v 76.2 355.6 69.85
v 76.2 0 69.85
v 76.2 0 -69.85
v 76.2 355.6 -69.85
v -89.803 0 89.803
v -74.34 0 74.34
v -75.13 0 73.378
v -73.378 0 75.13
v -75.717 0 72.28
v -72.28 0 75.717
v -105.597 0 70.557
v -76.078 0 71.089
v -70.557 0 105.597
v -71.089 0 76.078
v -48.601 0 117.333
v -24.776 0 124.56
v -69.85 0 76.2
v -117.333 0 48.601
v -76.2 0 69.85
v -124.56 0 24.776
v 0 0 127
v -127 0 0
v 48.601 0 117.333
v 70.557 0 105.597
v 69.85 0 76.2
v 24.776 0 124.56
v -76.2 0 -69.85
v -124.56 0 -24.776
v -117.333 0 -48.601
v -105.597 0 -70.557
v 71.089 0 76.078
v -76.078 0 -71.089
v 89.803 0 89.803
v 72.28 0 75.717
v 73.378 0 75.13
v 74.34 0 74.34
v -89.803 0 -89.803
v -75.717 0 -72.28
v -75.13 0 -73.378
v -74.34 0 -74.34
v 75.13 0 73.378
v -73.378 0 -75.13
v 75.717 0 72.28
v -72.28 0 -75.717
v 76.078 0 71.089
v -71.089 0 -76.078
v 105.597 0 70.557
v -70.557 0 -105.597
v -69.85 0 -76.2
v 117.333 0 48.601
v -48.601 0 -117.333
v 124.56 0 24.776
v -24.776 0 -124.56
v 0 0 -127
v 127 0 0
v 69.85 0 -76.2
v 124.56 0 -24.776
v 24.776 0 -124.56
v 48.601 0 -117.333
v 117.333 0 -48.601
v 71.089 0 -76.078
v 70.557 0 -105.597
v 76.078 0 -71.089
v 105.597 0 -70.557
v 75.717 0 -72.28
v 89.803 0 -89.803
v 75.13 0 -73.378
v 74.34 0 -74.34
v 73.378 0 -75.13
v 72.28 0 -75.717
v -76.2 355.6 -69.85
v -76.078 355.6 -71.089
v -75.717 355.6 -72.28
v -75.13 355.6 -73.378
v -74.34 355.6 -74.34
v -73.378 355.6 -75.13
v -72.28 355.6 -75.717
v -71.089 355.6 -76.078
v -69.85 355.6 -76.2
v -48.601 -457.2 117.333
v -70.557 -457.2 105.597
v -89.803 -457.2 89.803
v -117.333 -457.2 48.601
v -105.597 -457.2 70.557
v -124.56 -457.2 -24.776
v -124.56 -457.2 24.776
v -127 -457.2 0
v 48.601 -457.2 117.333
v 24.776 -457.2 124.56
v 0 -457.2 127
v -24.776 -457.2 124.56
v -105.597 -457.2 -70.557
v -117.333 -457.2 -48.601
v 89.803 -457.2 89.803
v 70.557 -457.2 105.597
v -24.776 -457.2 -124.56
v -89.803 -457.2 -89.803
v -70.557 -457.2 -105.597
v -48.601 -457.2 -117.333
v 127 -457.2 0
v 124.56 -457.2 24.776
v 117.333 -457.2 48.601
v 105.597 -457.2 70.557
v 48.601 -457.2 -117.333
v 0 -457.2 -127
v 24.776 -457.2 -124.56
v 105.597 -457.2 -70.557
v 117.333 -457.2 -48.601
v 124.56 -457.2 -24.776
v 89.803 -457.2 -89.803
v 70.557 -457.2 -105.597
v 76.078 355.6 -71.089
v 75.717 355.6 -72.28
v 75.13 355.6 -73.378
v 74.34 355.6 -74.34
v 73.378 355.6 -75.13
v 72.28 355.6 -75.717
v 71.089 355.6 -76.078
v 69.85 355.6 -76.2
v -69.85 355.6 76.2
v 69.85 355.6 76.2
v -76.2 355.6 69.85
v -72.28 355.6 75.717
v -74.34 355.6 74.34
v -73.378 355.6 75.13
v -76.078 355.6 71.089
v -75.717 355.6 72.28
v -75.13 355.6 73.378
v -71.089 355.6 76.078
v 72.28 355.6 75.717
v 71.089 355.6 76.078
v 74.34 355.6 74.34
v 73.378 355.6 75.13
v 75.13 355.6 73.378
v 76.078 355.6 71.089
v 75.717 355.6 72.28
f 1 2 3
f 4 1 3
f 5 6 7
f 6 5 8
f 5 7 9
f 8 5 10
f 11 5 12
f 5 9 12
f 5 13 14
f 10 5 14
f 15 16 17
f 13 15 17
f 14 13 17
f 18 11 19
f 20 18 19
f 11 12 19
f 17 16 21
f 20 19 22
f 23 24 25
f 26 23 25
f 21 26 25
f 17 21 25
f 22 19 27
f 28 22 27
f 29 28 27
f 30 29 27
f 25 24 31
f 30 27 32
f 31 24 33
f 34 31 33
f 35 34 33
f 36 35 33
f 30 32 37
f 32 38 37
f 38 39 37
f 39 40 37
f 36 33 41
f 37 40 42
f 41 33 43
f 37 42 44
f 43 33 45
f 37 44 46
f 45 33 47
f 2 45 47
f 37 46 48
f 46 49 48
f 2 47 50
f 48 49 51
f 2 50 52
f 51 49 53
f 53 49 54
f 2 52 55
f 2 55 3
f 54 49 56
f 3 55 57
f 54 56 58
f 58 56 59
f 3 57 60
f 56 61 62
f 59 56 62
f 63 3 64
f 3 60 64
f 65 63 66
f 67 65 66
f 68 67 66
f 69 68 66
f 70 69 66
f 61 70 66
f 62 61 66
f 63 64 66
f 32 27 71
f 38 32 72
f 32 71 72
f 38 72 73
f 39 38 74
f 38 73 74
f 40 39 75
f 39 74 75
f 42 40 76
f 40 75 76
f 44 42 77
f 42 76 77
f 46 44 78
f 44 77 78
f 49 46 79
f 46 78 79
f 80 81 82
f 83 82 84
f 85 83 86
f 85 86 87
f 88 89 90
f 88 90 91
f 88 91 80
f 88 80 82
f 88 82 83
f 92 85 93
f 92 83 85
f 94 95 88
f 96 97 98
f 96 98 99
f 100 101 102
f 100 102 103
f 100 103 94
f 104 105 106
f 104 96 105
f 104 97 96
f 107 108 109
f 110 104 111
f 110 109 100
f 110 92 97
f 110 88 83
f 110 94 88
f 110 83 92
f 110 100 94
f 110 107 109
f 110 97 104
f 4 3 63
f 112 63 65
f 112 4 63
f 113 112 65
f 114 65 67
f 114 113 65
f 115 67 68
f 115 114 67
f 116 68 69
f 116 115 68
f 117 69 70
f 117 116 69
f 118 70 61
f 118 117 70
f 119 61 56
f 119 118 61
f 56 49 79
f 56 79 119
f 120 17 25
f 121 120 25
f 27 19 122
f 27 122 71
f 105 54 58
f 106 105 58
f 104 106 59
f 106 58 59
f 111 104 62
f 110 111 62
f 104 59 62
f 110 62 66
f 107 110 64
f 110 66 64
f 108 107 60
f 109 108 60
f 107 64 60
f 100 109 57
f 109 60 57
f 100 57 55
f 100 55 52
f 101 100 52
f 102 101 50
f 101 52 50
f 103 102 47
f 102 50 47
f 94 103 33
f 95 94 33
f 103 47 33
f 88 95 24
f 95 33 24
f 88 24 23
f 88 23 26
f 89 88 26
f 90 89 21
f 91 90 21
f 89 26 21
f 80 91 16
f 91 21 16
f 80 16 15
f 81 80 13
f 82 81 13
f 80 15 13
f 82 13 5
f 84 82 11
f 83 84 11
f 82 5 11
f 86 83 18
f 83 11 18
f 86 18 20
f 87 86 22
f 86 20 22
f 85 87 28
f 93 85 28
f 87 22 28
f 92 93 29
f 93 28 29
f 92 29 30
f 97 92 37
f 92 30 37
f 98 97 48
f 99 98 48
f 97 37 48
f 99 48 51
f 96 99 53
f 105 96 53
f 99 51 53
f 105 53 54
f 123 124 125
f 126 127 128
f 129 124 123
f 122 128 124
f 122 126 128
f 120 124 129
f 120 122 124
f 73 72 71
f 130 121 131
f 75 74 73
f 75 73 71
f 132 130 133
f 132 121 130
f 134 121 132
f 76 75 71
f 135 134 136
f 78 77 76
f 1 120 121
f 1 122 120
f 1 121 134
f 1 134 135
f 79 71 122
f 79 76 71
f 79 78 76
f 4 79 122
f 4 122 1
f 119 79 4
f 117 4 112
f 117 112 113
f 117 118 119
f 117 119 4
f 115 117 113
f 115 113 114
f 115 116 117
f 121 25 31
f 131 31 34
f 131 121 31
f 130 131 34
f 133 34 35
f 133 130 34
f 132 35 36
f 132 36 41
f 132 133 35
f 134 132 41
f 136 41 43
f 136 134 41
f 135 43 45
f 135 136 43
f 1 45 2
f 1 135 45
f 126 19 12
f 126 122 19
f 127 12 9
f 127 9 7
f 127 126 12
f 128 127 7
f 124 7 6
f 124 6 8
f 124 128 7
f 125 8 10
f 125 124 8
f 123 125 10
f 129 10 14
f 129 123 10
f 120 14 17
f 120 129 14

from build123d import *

# Parameters (mm, degrees)
SKETCH1_W           = 152.4
SKETCH1_H           = 152.4
BOSS_EXTRUDE1_DEPTH = 355.6
FILLET1_R           = 6.35
SKETCH2_R           = 127
BOSS_EXTRUDE2_DEPTH = 457.2


with BuildPart() as part:
    # Sketch1 → Boss-Extrude1 (new body)
    with BuildSketch(Plane(origin=(0, 0, 0), x_dir=(1, 0, 0), z_dir=(0, 1, 0))):
        Rectangle(SKETCH1_W, SKETCH1_H)
    extrude(amount=BOSS_EXTRUDE1_DEPTH)

    # Fillet1
    fillet1_edges = [part.edges().sort_by_distance(p)[0] for p in [
        (-76.2, 177.8, -76.2),
        (76.2, 177.8, -76.2),
        (76.2, 177.8, 76.2),
        (-76.2, 177.8, 76.2),
    ]]
    fillet(fillet1_edges, radius=FILLET1_R)

    # Sketch2 → Boss-Extrude2 (add)
    with BuildSketch(Plane(origin=(0, 0, 0), x_dir=(-1, 0, 0), z_dir=(0, -1, 0))):
        with Locations(Location((0, 0, 0), (0, 0, 90))):
            Circle(SKETCH2_R)
    extrude(amount=BOSS_EXTRUDE2_DEPTH)


solid = part.part
